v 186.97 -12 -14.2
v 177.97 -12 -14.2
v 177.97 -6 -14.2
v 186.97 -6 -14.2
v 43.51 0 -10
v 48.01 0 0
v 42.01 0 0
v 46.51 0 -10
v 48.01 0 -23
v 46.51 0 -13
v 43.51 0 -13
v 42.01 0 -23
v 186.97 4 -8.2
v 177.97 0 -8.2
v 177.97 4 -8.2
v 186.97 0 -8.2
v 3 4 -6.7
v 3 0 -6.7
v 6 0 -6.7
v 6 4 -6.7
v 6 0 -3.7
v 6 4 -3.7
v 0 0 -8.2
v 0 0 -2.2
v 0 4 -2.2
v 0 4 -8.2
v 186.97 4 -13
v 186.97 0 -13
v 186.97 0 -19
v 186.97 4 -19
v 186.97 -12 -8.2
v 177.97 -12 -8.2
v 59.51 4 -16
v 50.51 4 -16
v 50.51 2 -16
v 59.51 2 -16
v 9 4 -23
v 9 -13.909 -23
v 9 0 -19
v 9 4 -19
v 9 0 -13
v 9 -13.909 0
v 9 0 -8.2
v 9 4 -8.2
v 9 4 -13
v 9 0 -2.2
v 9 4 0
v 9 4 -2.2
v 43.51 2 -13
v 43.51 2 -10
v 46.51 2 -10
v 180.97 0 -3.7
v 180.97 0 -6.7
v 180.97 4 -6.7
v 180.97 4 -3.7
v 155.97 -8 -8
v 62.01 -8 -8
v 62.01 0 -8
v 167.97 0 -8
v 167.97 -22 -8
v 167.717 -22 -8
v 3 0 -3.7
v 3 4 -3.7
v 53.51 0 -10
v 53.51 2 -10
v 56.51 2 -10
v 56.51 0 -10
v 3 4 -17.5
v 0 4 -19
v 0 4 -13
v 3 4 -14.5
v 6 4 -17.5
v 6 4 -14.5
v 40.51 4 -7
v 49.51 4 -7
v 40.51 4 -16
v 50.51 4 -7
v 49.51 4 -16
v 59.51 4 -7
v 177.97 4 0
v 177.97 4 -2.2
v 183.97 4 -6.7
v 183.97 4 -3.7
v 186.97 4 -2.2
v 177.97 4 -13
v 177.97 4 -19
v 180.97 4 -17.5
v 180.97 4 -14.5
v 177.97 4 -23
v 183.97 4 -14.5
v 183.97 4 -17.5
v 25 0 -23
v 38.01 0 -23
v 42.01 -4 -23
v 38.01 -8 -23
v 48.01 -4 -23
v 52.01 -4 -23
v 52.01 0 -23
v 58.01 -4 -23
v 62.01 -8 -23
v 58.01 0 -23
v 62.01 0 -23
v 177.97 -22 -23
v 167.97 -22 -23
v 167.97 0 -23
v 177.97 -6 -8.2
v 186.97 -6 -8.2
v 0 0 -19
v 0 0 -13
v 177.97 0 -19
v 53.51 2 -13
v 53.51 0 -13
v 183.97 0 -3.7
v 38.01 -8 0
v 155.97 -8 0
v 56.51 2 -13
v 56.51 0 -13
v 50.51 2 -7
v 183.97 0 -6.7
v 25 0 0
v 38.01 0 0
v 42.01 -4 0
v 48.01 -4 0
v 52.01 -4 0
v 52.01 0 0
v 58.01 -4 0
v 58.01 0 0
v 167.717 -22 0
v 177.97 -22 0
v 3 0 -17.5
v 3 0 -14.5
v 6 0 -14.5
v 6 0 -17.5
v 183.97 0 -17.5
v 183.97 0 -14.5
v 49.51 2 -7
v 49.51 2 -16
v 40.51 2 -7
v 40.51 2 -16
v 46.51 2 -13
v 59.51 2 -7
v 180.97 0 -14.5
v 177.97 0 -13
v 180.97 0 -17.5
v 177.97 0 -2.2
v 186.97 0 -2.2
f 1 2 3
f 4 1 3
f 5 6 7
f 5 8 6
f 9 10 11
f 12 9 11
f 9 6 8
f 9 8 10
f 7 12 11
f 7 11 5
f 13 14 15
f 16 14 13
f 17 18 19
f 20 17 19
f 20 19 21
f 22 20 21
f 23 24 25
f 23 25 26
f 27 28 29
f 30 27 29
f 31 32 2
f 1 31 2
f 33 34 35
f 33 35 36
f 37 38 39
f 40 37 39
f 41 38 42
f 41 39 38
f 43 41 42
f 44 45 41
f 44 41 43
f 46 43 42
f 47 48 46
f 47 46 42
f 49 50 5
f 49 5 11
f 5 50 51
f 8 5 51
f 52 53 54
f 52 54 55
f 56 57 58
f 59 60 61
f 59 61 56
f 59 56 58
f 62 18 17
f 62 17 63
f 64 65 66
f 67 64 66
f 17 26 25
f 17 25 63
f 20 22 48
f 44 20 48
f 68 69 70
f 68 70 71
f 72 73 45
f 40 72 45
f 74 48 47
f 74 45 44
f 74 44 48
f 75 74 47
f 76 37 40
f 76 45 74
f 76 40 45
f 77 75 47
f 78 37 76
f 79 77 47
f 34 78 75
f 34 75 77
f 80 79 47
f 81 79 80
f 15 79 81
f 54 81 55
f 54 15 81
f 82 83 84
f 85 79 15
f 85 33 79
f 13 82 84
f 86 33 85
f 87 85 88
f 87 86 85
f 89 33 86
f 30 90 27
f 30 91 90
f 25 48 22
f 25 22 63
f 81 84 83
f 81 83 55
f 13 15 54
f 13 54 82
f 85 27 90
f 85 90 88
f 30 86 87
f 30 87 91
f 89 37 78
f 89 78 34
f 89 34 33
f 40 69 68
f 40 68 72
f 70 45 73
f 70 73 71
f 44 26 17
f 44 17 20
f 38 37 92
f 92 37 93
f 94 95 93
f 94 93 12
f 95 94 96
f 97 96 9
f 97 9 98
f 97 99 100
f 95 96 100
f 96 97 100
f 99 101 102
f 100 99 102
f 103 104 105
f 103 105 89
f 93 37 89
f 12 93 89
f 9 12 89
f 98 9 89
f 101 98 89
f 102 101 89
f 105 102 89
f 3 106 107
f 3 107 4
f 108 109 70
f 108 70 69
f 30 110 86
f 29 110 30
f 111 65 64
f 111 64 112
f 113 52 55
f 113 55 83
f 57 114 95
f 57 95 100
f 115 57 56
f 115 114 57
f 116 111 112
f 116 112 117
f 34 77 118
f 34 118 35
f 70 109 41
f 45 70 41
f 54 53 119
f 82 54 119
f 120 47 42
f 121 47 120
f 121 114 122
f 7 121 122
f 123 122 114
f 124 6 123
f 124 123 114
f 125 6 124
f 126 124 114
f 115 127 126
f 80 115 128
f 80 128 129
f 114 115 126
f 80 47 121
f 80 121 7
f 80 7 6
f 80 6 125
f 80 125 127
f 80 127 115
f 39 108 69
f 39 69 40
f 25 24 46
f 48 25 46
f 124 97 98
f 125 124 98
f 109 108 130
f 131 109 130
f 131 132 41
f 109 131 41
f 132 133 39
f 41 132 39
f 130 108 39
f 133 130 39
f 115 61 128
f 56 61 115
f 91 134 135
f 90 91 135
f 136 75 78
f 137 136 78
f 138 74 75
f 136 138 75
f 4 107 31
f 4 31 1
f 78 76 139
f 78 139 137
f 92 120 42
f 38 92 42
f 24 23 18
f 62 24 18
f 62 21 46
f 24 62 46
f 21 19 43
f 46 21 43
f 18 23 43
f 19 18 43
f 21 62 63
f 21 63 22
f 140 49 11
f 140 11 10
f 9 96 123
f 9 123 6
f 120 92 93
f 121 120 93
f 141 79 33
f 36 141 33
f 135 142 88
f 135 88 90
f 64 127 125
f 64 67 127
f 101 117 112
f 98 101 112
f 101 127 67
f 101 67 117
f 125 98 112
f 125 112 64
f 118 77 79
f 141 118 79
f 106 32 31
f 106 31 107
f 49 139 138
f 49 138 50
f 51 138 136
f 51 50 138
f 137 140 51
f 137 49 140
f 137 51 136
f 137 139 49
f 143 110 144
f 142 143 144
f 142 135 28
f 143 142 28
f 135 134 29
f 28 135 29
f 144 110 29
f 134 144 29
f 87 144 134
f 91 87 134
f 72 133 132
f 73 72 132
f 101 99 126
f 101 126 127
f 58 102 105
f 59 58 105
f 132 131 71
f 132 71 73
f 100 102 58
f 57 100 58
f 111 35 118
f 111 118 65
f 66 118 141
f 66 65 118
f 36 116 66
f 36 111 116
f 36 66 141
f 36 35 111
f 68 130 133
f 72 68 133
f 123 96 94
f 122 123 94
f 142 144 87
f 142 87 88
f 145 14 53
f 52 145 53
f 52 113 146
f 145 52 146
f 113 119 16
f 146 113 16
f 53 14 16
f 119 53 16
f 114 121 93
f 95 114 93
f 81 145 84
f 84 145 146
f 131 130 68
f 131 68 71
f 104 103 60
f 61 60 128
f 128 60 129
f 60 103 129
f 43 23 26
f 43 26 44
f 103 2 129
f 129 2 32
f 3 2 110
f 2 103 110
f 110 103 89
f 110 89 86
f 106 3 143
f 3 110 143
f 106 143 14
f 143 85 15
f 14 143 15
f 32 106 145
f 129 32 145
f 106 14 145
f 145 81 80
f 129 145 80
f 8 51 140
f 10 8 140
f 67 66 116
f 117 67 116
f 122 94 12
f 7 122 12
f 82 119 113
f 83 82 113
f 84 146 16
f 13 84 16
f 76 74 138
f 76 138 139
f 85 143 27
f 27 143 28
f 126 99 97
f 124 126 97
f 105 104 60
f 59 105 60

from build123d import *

# Parameters (mm, degrees)
SKETCH1_W           = 186.97
SKETCH1_H           = 23
BOSS_EXTRUDE1_DEPTH = 4
SKETCH2_W           = 10
SKETCH2_H           = 23
BOSS_EXTRUDE2_DEPTH = 22
BOSS_EXTRUDE3_DEPTH = 8
CHAMFER1_SIZE       = 14.301043111
CHAMFER1_SIZE_2     = 12
CUT_EXTRUDE1_REACH  = 191.66
SKETCH4_W           = 9
SKETCH4_H           = 4.8
SKETCH4_H_2         = 4
SKETCH4_H_3         = 2.2
SKETCH4_W_2         = 3
SKETCH4_H_4         = 3
SKETCH5_W           = 6
SKETCH5_H           = 6
BOSS_EXTRUDE4_DEPTH = 9
CUT_EXTRUDE2_REACH  = 191.66
SKETCH6_W           = 6
SKETCH6_H           = 4
CUT_EXTRUDE3_REACH  = 192.165
SKETCH7_W           = 3
SKETCH7_H           = 3
SKETCH8_W           = 16
SKETCH8_H           = 23
BOSS_EXTRUDE5_DEPTH = 14
CHAMFER2_SIZE       = 14
CHAMFER2_SIZE_2     = 16.105157701
SKETCH9_W           = 9
SKETCH9_H           = 9
CUT_EXTRUDE4_DEPTH  = 2


with BuildPart() as part:
    # Sketch1 → Boss-Extrude1 (new body)
    with BuildSketch(Plane(origin=(0, 0, 0), x_dir=(1, 0, 0), z_dir=(0, 1, 0))):
        with Locations((93.485, 11.5)):
            Rectangle(SKETCH1_W, SKETCH1_H)
    extrude(amount=BOSS_EXTRUDE1_DEPTH)

    # Sketch2 → Boss-Extrude2 (add)
    with BuildSketch(Plane.XZ):
        with Locations((172.97, -11.5)):
            Rectangle(SKETCH2_W, SKETCH2_H)
    extrude(amount=BOSS_EXTRUDE2_DEPTH)

    # Sketch3 → Boss-Extrude3 (add)
    with BuildSketch(Plane.XZ):
        Polygon((167.97, 0), (38.01, 0), (38.01, -8), (38.01, -23), (62.01, -23), (62.01, -8), (167.97, -8), align=None)
    extrude(amount=BOSS_EXTRUDE3_DEPTH)

    # Chamfer1
    # the kernel refuses this chamfer: 14.301043111, 12 mm, written as the material it adds along each edge
    with BuildSketch(Plane(origin=(167.97, -8, -8), x_dir=(0.024939322090235156, -0.9996889667359941, 0), z_dir=(0, 0, 1))) as chamfer1_piece_1_section:
        Polygon((CHAMFER1_SIZE * 0.999688966745, -CHAMFER1_SIZE * 0.0249393220905), (-CHAMFER1_SIZE_2 * 0.0249393220902, -CHAMFER1_SIZE_2 * 0.999688966736), (0, 0), align=None)
    chamfer1_piece_1 = extrude(amount=8, mode=Mode.PRIVATE)
    chamfer1_piece_1 = split(chamfer1_piece_1, bisect_by=Plane(origin=(164.021429924, -22, -4), z_dir=(0, 1, 0)), keep=Keep.TOP, mode=Mode.PRIVATE)
    add(chamfer1_piece_1)

    # Sketch4 → Cut-Extrude1 (cut, up to next)
    with BuildSketch(Plane.XZ, mode=Mode.PRIVATE) as cut_extrude1_sk1:
        with Locations((182.47, -10.6)):
            Rectangle(SKETCH4_W, SKETCH4_H)
    cut_extrude1_tool1 = extrude(cut_extrude1_sk1.sketch, amount=-CUT_EXTRUDE1_REACH, mode=Mode.PRIVATE) & part.part
    # Sketch4 → Cut-Extrude1 (cut, up to next)
    with BuildSketch(Plane.XZ, mode=Mode.PRIVATE) as cut_extrude1_sk2:
        with Locations((182.47, -21)):
            Rectangle(SKETCH4_W, SKETCH4_H_2)
    cut_extrude1_tool2 = extrude(cut_extrude1_sk2.sketch, amount=-CUT_EXTRUDE1_REACH, mode=Mode.PRIVATE) & part.part
    # Sketch4 → Cut-Extrude1 (cut, up to next)
    with BuildSketch(Plane.XZ, mode=Mode.PRIVATE) as cut_extrude1_sk3:
        with Locations((182.47, -1.1)):
            Rectangle(SKETCH4_W, SKETCH4_H_3)
    cut_extrude1_tool3 = extrude(cut_extrude1_sk3.sketch, amount=-CUT_EXTRUDE1_REACH, mode=Mode.PRIVATE) & part.part
    # Sketch4 → Cut-Extrude1 (cut, up to next)
    with BuildSketch(Plane.XZ, mode=Mode.PRIVATE) as cut_extrude1_sk4:
        with Locations((182.47, -16)):
            Rectangle(SKETCH4_W_2, SKETCH4_H_4)
    cut_extrude1_tool4 = extrude(cut_extrude1_sk4.sketch, amount=-CUT_EXTRUDE1_REACH, mode=Mode.PRIVATE) & part.part
    # Sketch4 → Cut-Extrude1 (cut, up to next)
    with BuildSketch(Plane.XZ, mode=Mode.PRIVATE) as cut_extrude1_sk5:
        with Locations((182.47, -5.2)):
            Rectangle(SKETCH4_W_2, SKETCH4_H_4)
    cut_extrude1_tool5 = extrude(cut_extrude1_sk5.sketch, amount=-CUT_EXTRUDE1_REACH, mode=Mode.PRIVATE) & part.part
    # Sketch4 → Cut-Extrude1 (cut, up to next)
    with BuildSketch(Plane.XZ, mode=Mode.PRIVATE) as cut_extrude1_sk6:
        with Locations((4.5, -1.1)):
            Rectangle(SKETCH4_W, SKETCH4_H_3)
    cut_extrude1_tool6 = extrude(cut_extrude1_sk6.sketch, amount=-CUT_EXTRUDE1_REACH, mode=Mode.PRIVATE) & part.part
    # Sketch4 → Cut-Extrude1 (cut, up to next)
    with BuildSketch(Plane.XZ, mode=Mode.PRIVATE) as cut_extrude1_sk7:
        with Locations((4.5, -5.2)):
            Rectangle(SKETCH4_W_2, SKETCH4_H_4)
    cut_extrude1_tool7 = extrude(cut_extrude1_sk7.sketch, amount=-CUT_EXTRUDE1_REACH, mode=Mode.PRIVATE) & part.part
    # Sketch4 → Cut-Extrude1 (cut, up to next)
    with BuildSketch(Plane.XZ, mode=Mode.PRIVATE) as cut_extrude1_sk8:
        with Locations((4.5, -10.6)):
            Rectangle(SKETCH4_W, SKETCH4_H)
    cut_extrude1_tool8 = extrude(cut_extrude1_sk8.sketch, amount=-CUT_EXTRUDE1_REACH, mode=Mode.PRIVATE) & part.part
    # Sketch4 → Cut-Extrude1 (cut, up to next)
    with BuildSketch(Plane.XZ, mode=Mode.PRIVATE) as cut_extrude1_sk9:
        with Locations((4.5, -16)):
            Rectangle(SKETCH4_W_2, SKETCH4_H_4)
    cut_extrude1_tool9 = extrude(cut_extrude1_sk9.sketch, amount=-CUT_EXTRUDE1_REACH, mode=Mode.PRIVATE) & part.part
    # Sketch4 → Cut-Extrude1 (cut, up to next)
    with BuildSketch(Plane.XZ, mode=Mode.PRIVATE) as cut_extrude1_sk10:
        with Locations((4.5, -21)):
            Rectangle(SKETCH4_W, SKETCH4_H_2)
    cut_extrude1_tool10 = extrude(cut_extrude1_sk10.sketch, amount=-CUT_EXTRUDE1_REACH, mode=Mode.PRIVATE) & part.part
    add(cut_extrude1_tool1.solids().sort_by_distance((182.47, 0, -10.6))[0], mode=Mode.SUBTRACT)
    add(cut_extrude1_tool2.solids().sort_by_distance((182.47, 0, -21))[0], mode=Mode.SUBTRACT)
    add(cut_extrude1_tool3.solids().sort_by_distance((182.47, 0, -1.1))[0], mode=Mode.SUBTRACT)
    add(cut_extrude1_tool4.solids().sort_by_distance((182.47, 0, -16))[0], mode=Mode.SUBTRACT)
    add(cut_extrude1_tool5.solids().sort_by_distance((182.47, 0, -5.2))[0], mode=Mode.SUBTRACT)
    add(cut_extrude1_tool6.solids().sort_by_distance((4.5, 0, -1.1))[0], mode=Mode.SUBTRACT)
    add(cut_extrude1_tool7.solids().sort_by_distance((4.5, 0, -5.2))[0], mode=Mode.SUBTRACT)
    add(cut_extrude1_tool8.solids().sort_by_distance((4.5, 0, -10.6))[0], mode=Mode.SUBTRACT)
    add(cut_extrude1_tool9.solids().sort_by_distance((4.5, 0, -16))[0], mode=Mode.SUBTRACT)
    add(cut_extrude1_tool10.solids().sort_by_distance((4.5, 0, -21))[0], mode=Mode.SUBTRACT)

    # Sketch5 → Boss-Extrude4 (add)
    with BuildSketch(Plane(origin=(177.97, 0, 0), x_dir=(0, 0, -1), z_dir=(1, 0, 0))):
        with Locations((11.2, -9)):
            Rectangle(SKETCH5_W, SKETCH5_H)
    extrude(amount=BOSS_EXTRUDE4_DEPTH)

    # Sketch6 → Cut-Extrude2 (cut, up to next)
    with BuildSketch(Plane(origin=(0, 0, -23), x_dir=(-1, 0, 0), z_dir=(0, 0, -1)), mode=Mode.PRIVATE) as cut_extrude2_sk1:
        with Locations((-55.01, -2)):
            Rectangle(SKETCH6_W, SKETCH6_H)
    cut_extrude2_tool1 = extrude(cut_extrude2_sk1.sketch, amount=-CUT_EXTRUDE2_REACH, mode=Mode.PRIVATE) & part.part
    # Sketch6 → Cut-Extrude2 (cut, up to next)
    with BuildSketch(Plane(origin=(0, 0, -23), x_dir=(-1, 0, 0), z_dir=(0, 0, -1)), mode=Mode.PRIVATE) as cut_extrude2_sk2:
        with Locations((-45.01, -2)):
            Rectangle(SKETCH6_W, SKETCH6_H)
    cut_extrude2_tool2 = extrude(cut_extrude2_sk2.sketch, amount=-CUT_EXTRUDE2_REACH, mode=Mode.PRIVATE) & part.part
    add(cut_extrude2_tool1.solids().sort_by_distance((55.01, -2, -23))[0], mode=Mode.SUBTRACT)
    add(cut_extrude2_tool2.solids().sort_by_distance((45.01, -2, -23))[0], mode=Mode.SUBTRACT)

    # Sketch7 → Cut-Extrude3 (cut, up to next)
    with BuildSketch(Plane(origin=(0, 4, 0), x_dir=(1, 0, 0), z_dir=(0, 1, 0)), mode=Mode.PRIVATE) as cut_extrude3_sk1:
        with Locations((45.01, 11.5)):
            Rectangle(SKETCH7_W, SKETCH7_H)
    cut_extrude3_tool1 = extrude(cut_extrude3_sk1.sketch, amount=-CUT_EXTRUDE3_REACH, mode=Mode.PRIVATE) & part.part
    # Sketch7 → Cut-Extrude3 (cut, up to next)
    with BuildSketch(Plane(origin=(0, 4, 0), x_dir=(1, 0, 0), z_dir=(0, 1, 0)), mode=Mode.PRIVATE) as cut_extrude3_sk2:
        with Locations((55.01, 11.5)):
            Rectangle(SKETCH7_W, SKETCH7_H)
    cut_extrude3_tool2 = extrude(cut_extrude3_sk2.sketch, amount=-CUT_EXTRUDE3_REACH, mode=Mode.PRIVATE) & part.part
    add(cut_extrude3_tool1.solids().sort_by_distance((45.01, 4, -11.5))[0], mode=Mode.SUBTRACT)
    add(cut_extrude3_tool2.solids().sort_by_distance((55.01, 4, -11.5))[0], mode=Mode.SUBTRACT)

    # Sketch8 → Boss-Extrude5 (add)
    with BuildSketch(Plane.XZ):
        with Locations((17, -11.5)):
            Rectangle(SKETCH8_W, SKETCH8_H)
    extrude(amount=BOSS_EXTRUDE5_DEPTH)

    # Chamfer2
    # the kernel refuses this chamfer: 16.105157701, 14 mm, written as the material it takes off along each edge
    with BuildSketch(Plane(origin=(25, -14, 41.491821244), x_dir=(0.033690971337926715, 0.9994322980824198, 0), z_dir=(0, 0, -1))) as chamfer2_piece_1_section:
        Polygon((CHAMFER2_SIZE * 0.999432298082, -CHAMFER2_SIZE * 0.0336909713379), (-CHAMFER2_SIZE_2 * 0.0336909713381, -CHAMFER2_SIZE_2 * 0.999432298088), (0, 0), align=None)
    chamfer2_piece_1 = extrude(amount=105.983642488, mode=Mode.PRIVATE)
    chamfer2_piece_1 = split(chamfer2_piece_1, bisect_by=Plane(origin=(19.65817275, 0, -11.5), z_dir=(0, -1, 0)), keep=Keep.TOP, mode=Mode.PRIVATE)
    add(chamfer2_piece_1, mode=Mode.SUBTRACT)

    # Sketch9 → Cut-Extrude4 (cut)
    with BuildSketch(Plane(origin=(0, 4, 0), x_dir=(1, 0, 0), z_dir=(0, 1, 0))):
        with Locations((45.01, 11.5)):
            Rectangle(SKETCH9_W, SKETCH9_H)
        with Locations((55.01, 11.5)):
            Rectangle(SKETCH9_W, SKETCH9_H)
    extrude(amount=-CUT_EXTRUDE4_DEPTH, mode=Mode.SUBTRACT)


solid = part.part
